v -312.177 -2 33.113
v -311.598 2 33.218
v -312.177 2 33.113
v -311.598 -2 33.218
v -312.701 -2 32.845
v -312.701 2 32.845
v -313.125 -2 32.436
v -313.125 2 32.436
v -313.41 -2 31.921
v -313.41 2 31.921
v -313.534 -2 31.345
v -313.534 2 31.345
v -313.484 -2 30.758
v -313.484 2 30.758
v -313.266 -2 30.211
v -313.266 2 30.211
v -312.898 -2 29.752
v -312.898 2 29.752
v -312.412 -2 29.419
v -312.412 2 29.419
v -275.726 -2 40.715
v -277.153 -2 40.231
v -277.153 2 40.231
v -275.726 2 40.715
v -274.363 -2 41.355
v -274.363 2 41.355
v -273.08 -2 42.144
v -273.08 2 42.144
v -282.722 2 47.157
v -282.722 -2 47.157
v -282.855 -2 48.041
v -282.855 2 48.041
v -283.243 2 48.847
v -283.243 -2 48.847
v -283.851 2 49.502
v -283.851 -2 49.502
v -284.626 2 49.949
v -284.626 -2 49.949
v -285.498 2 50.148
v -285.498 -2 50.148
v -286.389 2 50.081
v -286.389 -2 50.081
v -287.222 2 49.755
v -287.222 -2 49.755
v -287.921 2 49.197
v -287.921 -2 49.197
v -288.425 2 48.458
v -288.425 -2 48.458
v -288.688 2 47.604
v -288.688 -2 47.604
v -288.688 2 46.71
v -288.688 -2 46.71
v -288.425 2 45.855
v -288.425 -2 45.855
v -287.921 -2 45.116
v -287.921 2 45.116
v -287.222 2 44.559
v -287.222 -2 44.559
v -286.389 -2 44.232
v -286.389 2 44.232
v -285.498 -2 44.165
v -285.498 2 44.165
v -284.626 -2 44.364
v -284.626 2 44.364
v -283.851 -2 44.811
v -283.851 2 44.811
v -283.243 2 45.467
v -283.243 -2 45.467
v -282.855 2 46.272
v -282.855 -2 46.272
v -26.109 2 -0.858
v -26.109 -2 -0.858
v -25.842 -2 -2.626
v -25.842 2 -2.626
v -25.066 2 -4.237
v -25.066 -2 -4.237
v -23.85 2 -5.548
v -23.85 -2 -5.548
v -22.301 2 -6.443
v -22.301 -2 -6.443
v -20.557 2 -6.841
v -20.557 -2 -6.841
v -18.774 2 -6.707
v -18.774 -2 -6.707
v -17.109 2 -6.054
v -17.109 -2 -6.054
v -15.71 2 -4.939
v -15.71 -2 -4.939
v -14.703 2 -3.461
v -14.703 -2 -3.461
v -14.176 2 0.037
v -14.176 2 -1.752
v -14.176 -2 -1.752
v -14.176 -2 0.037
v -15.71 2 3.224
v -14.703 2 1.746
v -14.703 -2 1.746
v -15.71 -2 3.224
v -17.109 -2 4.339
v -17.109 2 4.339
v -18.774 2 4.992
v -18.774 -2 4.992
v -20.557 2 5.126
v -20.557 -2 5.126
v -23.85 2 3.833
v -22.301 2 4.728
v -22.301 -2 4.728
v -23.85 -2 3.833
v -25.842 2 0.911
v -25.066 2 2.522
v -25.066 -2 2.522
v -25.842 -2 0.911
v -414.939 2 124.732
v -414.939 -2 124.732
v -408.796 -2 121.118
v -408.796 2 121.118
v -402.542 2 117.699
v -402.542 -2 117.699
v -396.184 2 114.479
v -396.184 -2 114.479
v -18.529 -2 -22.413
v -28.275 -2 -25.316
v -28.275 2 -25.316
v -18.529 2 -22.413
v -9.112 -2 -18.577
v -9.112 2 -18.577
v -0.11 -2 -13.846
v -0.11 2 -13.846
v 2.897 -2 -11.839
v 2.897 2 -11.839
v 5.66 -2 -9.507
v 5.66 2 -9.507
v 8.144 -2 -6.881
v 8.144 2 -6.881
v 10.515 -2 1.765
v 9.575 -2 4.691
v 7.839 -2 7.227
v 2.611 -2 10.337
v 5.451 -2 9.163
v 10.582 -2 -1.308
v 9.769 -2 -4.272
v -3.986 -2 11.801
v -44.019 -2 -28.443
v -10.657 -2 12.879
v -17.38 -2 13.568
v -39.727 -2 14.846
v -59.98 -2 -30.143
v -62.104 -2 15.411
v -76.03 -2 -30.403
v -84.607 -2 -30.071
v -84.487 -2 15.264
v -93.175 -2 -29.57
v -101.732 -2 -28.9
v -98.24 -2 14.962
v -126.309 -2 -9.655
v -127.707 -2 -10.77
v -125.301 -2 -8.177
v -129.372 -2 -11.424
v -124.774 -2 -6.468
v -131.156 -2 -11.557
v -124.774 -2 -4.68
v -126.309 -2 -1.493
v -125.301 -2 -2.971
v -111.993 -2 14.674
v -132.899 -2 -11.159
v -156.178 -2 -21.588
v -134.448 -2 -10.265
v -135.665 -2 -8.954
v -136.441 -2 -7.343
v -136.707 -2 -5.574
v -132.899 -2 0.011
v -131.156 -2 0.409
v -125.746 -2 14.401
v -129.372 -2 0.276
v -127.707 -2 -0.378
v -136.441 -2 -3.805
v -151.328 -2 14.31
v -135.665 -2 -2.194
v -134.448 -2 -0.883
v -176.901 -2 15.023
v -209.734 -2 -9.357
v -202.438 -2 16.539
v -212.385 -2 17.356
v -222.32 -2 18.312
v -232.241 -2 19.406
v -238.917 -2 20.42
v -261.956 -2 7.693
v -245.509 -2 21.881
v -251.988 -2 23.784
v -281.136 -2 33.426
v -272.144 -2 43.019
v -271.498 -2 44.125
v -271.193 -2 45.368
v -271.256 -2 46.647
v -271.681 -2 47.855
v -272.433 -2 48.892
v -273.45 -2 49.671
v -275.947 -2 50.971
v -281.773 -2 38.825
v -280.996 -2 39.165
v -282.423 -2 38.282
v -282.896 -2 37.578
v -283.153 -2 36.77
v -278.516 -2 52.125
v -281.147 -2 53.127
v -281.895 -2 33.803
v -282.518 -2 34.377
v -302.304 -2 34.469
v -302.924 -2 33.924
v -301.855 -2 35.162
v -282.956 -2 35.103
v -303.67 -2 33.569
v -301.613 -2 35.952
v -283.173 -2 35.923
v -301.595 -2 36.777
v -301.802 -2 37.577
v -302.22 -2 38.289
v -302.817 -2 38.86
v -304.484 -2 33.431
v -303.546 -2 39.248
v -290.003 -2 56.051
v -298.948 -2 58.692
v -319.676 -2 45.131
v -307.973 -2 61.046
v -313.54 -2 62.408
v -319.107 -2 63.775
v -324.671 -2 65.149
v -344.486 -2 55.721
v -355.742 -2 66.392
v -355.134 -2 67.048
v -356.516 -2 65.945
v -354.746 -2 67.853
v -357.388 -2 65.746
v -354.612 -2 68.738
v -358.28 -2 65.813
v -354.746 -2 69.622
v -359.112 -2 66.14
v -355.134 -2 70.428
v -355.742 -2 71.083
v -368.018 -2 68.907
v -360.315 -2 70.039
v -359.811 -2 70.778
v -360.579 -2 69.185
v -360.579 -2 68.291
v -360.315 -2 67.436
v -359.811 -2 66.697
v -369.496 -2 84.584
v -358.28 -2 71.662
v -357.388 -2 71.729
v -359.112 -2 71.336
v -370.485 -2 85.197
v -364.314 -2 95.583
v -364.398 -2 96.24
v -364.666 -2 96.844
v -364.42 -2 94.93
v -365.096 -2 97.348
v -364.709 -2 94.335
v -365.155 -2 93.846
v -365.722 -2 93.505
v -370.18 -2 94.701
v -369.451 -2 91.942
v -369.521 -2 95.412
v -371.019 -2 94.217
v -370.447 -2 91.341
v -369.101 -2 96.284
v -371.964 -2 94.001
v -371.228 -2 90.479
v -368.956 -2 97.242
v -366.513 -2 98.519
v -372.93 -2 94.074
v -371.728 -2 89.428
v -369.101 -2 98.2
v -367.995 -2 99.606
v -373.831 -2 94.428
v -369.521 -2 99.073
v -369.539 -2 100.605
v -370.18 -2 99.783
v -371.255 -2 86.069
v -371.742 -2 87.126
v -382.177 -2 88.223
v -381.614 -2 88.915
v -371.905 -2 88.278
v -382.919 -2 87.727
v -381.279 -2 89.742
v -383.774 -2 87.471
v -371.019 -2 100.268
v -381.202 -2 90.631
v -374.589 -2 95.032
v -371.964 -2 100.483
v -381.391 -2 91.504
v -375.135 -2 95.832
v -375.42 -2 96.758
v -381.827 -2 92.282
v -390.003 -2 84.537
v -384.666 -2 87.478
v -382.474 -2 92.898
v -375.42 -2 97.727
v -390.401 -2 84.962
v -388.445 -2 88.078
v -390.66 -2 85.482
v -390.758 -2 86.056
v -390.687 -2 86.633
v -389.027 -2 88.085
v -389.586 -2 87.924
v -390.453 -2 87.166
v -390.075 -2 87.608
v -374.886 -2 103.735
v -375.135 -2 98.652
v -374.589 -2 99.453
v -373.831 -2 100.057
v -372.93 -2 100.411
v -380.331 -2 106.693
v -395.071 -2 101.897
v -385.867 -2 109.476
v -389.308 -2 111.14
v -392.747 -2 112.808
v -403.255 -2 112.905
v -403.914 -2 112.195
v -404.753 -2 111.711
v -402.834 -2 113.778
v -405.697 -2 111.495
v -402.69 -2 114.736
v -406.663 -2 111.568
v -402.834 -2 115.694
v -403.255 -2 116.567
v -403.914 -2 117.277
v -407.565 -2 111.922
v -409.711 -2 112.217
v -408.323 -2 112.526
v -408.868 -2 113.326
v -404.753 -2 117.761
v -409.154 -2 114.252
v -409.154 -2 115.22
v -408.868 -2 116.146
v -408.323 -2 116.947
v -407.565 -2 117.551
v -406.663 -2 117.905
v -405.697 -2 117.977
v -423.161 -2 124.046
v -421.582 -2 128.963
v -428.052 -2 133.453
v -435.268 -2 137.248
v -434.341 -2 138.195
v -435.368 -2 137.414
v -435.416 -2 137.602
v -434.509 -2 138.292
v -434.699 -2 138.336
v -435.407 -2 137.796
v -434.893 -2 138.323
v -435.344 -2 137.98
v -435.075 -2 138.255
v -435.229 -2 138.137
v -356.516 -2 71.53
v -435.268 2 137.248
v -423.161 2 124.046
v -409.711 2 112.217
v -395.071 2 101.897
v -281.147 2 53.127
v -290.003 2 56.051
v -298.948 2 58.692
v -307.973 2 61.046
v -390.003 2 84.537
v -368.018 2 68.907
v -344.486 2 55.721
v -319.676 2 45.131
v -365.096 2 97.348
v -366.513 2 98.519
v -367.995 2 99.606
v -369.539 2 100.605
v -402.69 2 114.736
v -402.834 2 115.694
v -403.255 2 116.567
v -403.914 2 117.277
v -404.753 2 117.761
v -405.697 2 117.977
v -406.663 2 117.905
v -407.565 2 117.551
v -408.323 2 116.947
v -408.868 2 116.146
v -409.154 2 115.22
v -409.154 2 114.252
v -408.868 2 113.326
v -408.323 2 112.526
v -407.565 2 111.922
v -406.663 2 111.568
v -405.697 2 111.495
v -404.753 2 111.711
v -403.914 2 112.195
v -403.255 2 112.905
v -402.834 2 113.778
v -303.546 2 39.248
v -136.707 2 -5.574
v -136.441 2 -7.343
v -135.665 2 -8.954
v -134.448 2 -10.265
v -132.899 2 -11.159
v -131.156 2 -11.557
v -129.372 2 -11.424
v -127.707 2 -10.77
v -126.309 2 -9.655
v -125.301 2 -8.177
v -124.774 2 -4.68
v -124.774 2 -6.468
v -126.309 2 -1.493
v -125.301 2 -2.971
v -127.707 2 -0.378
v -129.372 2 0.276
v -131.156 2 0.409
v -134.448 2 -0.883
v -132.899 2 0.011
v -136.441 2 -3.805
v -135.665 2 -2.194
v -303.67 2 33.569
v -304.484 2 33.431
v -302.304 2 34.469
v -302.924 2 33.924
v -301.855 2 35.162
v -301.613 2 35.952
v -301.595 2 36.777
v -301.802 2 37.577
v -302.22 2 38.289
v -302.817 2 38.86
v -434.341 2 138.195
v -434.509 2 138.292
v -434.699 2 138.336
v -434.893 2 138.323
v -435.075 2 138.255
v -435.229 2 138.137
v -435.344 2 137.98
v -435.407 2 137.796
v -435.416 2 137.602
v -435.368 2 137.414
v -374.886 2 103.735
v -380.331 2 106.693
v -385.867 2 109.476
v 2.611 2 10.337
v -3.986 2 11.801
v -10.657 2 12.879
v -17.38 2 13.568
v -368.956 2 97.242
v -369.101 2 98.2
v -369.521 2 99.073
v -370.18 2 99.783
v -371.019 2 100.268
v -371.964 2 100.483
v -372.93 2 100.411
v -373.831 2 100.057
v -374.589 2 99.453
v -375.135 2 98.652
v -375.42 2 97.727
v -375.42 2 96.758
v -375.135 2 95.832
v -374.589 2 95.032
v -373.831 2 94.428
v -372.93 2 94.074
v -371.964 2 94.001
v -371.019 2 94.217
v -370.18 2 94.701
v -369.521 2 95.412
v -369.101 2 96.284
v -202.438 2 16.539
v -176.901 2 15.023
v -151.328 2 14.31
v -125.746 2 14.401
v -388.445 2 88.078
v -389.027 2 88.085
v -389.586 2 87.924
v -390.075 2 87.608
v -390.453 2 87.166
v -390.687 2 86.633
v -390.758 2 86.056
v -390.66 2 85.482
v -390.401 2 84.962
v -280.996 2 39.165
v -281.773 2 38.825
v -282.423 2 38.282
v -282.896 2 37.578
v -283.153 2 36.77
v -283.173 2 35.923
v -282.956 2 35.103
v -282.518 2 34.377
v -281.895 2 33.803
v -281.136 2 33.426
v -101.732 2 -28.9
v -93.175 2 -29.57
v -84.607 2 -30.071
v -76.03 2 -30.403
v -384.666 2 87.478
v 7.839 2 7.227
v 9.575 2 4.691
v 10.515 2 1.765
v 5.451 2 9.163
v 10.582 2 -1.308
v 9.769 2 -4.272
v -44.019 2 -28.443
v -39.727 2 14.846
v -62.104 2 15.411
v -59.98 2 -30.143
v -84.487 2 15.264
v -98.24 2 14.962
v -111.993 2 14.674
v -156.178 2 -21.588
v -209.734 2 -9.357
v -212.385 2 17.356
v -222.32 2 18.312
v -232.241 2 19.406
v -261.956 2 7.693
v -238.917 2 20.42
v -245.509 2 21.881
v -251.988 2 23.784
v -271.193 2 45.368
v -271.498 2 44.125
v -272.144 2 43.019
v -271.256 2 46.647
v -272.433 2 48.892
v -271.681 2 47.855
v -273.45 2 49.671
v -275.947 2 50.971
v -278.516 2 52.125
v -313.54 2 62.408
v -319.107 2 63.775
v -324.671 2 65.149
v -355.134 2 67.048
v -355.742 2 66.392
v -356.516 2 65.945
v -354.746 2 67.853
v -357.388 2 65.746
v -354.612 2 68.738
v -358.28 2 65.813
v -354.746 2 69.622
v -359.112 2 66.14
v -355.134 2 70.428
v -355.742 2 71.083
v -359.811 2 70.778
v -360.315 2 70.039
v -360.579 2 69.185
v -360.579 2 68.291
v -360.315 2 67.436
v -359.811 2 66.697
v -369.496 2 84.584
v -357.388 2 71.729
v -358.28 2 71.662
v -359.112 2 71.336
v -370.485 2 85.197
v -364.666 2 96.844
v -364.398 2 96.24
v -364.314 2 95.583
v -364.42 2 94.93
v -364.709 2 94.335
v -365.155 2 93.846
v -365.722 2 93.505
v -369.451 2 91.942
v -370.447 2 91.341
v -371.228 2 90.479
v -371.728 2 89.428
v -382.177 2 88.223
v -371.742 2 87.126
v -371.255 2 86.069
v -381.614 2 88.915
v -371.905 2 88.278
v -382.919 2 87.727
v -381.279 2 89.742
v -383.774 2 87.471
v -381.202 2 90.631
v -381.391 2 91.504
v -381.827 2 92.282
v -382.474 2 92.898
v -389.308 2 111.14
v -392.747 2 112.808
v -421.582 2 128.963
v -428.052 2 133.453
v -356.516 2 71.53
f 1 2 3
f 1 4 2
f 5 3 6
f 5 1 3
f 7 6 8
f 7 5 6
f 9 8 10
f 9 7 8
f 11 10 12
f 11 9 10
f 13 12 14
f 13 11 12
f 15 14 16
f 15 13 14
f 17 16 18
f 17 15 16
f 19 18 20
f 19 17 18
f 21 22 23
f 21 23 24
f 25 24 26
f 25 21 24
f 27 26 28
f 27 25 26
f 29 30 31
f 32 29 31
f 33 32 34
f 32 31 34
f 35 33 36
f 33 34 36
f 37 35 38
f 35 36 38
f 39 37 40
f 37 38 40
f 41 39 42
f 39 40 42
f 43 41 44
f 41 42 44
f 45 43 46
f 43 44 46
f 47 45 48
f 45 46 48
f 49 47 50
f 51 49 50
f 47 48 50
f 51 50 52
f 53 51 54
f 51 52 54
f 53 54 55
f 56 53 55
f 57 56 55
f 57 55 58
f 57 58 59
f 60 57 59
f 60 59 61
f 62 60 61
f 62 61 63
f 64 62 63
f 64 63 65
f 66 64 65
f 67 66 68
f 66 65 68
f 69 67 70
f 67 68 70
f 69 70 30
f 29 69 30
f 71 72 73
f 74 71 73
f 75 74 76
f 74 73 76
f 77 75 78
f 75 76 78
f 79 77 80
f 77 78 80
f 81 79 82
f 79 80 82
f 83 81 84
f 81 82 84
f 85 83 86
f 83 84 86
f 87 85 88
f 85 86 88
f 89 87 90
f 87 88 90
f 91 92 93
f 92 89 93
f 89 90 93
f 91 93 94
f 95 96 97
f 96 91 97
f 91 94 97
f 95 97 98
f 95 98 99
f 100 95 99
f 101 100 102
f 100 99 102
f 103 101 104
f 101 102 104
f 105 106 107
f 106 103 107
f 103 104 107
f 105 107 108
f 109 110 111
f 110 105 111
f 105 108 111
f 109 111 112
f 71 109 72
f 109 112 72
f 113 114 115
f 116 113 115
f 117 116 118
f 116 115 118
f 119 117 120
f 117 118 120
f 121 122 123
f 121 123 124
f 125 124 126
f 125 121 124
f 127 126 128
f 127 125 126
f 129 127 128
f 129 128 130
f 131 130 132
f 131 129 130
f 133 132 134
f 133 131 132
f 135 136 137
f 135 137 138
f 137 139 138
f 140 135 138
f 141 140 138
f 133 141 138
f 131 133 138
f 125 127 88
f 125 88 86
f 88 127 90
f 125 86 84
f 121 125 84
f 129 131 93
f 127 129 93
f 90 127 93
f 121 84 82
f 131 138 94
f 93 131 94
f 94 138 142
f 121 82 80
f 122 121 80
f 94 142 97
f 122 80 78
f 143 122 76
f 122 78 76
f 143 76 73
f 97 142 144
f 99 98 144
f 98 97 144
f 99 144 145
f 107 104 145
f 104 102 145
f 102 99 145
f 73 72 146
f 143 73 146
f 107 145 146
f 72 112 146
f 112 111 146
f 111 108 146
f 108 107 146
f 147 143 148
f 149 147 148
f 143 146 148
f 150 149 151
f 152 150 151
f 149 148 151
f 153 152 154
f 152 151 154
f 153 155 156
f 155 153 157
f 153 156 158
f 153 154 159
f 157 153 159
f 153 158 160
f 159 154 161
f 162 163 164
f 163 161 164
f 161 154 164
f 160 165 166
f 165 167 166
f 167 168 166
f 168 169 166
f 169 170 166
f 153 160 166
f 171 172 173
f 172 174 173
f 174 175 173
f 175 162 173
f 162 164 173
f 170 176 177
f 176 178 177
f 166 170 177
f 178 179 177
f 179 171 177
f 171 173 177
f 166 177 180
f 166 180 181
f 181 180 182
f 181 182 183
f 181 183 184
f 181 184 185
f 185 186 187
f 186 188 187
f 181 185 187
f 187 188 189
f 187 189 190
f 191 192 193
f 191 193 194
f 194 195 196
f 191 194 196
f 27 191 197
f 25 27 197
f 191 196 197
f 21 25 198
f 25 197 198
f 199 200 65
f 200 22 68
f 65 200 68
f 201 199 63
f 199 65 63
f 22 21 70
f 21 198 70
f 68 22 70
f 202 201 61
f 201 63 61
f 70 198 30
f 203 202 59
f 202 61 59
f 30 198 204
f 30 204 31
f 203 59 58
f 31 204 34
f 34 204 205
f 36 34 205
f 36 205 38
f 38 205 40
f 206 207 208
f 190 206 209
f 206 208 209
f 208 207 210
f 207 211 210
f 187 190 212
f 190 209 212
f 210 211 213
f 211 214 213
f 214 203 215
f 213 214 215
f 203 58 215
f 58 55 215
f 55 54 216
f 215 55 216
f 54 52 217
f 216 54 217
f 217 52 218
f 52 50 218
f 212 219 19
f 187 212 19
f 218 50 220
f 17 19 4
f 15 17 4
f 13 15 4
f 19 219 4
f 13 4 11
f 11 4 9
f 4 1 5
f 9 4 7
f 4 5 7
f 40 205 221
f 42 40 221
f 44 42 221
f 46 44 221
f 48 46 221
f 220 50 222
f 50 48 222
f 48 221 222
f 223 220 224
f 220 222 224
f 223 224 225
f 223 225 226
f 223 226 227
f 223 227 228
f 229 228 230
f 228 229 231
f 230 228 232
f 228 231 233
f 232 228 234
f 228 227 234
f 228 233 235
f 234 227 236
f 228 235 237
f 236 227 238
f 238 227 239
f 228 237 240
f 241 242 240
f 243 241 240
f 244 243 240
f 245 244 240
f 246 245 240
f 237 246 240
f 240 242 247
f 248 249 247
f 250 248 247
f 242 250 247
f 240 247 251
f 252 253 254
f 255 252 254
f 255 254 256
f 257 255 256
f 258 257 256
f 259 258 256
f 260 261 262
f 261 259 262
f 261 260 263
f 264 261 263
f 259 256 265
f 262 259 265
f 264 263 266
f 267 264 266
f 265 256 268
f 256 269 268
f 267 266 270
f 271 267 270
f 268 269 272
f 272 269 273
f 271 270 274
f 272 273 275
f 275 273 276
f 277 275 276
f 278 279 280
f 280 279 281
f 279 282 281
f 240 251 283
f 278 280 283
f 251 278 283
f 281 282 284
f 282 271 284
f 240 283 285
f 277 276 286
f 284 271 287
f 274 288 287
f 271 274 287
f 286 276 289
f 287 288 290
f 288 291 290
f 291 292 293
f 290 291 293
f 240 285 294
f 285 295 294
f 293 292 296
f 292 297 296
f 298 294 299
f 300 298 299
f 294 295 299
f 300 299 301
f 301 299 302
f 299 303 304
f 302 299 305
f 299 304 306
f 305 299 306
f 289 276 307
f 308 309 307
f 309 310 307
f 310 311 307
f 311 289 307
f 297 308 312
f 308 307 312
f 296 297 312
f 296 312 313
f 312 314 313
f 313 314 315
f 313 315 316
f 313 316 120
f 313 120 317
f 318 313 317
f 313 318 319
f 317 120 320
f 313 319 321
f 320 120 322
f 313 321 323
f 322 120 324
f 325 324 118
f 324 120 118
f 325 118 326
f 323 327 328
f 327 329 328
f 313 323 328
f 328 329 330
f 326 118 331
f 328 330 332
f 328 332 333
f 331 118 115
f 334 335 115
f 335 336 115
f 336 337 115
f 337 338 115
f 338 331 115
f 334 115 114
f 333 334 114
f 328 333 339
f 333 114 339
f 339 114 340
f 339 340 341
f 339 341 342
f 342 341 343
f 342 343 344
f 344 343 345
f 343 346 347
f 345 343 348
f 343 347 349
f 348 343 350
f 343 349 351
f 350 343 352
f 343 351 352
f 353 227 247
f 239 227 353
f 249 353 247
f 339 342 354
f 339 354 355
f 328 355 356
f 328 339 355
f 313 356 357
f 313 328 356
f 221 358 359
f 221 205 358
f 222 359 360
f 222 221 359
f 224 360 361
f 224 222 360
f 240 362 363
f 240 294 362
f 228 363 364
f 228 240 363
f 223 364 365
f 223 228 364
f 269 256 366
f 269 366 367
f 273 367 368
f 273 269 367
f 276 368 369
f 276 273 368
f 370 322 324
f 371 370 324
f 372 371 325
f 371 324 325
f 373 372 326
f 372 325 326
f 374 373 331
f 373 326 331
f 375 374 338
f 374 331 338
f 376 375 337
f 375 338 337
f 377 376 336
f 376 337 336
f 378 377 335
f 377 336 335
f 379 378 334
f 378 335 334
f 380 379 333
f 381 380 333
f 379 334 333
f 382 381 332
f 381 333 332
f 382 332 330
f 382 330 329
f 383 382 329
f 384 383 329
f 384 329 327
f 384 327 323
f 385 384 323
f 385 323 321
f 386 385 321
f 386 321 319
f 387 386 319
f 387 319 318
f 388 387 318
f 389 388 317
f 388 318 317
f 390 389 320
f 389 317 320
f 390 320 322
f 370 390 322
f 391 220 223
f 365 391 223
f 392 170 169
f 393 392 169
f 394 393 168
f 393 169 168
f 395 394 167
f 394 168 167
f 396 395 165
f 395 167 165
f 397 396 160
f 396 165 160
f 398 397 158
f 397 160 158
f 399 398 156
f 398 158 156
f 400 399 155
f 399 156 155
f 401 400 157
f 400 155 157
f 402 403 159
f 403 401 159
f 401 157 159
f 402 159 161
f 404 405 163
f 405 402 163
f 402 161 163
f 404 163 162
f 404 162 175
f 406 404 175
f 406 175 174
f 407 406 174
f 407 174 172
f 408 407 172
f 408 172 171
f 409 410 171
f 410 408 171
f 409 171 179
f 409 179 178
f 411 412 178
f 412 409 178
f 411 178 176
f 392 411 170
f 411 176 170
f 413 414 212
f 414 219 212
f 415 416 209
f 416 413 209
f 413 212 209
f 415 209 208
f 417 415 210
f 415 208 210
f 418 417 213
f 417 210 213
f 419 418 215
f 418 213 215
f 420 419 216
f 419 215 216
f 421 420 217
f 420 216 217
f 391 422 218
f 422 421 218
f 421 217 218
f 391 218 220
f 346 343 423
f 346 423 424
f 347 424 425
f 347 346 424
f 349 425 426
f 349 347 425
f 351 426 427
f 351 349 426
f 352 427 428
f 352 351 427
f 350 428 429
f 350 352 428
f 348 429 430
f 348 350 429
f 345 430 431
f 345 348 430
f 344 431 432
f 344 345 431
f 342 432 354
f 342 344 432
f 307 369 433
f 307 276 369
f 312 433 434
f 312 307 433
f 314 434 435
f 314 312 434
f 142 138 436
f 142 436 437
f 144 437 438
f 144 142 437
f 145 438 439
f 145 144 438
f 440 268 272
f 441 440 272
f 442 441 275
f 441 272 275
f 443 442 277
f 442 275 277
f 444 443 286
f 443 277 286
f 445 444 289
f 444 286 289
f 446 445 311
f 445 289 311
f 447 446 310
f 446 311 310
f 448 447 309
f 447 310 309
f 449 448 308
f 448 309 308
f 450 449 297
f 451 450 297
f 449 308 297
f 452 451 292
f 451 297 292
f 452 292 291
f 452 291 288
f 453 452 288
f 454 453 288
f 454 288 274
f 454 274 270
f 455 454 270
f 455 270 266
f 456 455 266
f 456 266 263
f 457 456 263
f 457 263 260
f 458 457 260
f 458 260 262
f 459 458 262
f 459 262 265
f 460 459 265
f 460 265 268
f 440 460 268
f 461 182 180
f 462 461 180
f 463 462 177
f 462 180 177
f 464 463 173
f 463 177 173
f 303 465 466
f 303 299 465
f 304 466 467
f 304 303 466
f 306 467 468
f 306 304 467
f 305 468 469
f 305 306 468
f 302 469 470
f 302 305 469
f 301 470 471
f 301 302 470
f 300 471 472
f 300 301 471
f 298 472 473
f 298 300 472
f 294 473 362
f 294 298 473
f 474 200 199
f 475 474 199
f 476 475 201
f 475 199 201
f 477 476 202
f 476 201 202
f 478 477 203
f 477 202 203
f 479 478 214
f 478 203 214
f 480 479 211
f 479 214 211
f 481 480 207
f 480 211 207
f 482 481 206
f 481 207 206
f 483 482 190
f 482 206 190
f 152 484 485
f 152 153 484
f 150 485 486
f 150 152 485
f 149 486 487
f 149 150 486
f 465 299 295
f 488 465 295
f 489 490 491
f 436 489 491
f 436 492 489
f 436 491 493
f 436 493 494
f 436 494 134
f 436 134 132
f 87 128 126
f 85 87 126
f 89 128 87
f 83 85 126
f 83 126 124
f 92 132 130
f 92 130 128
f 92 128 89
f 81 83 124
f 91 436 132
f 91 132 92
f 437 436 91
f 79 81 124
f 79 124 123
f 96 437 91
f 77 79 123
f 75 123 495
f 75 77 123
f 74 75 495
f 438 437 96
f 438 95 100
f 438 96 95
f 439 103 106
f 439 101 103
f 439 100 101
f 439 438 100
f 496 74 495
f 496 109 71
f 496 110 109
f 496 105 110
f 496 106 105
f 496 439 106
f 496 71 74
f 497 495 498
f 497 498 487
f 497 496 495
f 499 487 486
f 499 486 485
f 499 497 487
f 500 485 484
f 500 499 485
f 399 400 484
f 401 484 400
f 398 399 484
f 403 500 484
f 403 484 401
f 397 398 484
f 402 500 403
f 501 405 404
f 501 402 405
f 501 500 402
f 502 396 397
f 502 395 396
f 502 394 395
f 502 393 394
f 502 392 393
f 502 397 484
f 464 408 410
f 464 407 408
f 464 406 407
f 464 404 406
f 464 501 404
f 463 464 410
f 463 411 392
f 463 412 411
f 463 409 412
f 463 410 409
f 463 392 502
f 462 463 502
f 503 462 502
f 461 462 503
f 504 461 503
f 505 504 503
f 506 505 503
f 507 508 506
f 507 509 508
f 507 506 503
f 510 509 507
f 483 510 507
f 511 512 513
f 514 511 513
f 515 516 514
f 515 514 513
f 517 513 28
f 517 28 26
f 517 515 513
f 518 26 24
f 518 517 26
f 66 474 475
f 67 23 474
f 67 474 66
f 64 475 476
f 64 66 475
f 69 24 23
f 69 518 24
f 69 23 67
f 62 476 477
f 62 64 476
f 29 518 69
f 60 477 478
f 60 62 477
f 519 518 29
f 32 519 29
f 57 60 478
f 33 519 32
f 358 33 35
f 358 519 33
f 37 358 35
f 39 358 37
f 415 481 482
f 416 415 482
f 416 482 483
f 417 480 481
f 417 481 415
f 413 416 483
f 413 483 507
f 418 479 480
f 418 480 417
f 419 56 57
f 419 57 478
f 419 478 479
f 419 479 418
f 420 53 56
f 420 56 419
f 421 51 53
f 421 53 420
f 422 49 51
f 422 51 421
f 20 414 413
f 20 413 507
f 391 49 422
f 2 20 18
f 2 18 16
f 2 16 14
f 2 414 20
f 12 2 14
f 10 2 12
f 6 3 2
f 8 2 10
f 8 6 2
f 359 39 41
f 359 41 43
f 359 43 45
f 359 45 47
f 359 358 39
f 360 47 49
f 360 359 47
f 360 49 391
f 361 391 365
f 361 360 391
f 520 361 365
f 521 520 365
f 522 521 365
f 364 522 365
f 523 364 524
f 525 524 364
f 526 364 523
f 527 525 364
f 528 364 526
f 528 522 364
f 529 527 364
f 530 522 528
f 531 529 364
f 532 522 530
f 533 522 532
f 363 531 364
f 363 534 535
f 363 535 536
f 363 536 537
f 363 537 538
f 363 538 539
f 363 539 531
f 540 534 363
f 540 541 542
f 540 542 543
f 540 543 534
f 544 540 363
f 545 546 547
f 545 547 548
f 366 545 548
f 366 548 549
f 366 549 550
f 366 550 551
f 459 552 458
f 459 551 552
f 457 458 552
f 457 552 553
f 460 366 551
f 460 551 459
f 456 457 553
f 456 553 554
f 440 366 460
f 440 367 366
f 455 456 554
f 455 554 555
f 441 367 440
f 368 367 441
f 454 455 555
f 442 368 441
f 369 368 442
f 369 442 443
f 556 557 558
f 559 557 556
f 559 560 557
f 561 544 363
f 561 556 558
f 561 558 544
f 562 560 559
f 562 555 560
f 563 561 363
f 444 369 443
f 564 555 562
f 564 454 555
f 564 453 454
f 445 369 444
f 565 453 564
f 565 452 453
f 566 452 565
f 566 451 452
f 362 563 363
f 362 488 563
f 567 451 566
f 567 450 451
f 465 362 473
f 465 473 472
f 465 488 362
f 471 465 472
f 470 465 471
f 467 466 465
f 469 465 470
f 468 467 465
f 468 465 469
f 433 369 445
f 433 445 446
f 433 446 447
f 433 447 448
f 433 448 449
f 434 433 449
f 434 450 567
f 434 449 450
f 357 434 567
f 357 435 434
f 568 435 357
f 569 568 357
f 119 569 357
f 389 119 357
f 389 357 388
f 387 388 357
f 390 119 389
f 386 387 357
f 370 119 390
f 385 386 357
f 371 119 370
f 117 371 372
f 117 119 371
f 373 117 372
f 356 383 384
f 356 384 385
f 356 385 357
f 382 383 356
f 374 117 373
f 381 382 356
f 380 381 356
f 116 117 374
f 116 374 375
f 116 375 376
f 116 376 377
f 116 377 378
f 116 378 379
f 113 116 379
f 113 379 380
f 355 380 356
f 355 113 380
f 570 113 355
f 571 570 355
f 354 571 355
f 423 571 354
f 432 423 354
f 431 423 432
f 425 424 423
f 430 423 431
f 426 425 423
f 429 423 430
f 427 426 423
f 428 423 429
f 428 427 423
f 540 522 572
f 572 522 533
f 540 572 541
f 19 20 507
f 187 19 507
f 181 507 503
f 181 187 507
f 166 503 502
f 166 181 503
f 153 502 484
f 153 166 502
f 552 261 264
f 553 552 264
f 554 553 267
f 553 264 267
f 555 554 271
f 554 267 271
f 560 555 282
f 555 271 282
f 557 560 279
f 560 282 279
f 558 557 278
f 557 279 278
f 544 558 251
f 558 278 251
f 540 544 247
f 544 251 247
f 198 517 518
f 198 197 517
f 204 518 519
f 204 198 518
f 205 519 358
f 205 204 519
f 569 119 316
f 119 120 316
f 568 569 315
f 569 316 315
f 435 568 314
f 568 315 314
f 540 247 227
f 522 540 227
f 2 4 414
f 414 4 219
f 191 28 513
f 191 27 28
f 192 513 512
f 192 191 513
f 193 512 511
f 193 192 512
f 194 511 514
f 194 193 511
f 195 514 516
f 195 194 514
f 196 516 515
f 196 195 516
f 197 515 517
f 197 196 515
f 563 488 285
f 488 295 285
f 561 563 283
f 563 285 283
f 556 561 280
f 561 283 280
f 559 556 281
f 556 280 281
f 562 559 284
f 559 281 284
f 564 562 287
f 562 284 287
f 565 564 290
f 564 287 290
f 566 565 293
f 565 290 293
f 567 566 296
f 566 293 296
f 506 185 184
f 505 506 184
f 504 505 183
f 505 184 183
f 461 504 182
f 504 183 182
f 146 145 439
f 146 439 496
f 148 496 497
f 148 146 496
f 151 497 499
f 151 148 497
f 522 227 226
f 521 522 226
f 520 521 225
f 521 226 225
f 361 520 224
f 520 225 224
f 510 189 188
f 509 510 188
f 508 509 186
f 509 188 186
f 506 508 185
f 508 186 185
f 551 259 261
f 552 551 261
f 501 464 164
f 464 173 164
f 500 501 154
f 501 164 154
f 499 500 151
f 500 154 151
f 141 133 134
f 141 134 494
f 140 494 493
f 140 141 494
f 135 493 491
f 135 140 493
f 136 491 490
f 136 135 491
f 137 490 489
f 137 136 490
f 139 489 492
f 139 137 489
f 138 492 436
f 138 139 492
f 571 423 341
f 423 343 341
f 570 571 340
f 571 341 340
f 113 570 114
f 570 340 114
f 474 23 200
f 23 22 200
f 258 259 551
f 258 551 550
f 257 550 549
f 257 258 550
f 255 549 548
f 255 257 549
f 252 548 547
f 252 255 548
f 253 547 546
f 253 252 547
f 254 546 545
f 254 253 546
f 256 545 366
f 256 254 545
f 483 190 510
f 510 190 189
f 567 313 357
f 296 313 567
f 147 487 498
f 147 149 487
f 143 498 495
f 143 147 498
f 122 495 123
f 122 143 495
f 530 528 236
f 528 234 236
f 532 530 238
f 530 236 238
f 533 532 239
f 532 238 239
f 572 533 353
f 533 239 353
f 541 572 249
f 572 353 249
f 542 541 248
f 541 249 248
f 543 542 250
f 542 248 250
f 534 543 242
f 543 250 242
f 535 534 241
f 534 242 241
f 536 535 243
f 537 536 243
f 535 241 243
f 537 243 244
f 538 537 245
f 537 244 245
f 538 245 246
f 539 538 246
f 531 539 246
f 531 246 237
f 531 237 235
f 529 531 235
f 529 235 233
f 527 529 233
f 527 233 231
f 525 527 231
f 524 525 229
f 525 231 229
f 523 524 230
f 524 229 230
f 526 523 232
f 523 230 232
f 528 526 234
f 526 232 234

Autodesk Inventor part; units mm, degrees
ref_plane "YZ Plane" through (0, 0, 0) normal (1, 0, 0) x (0, 1, 0)
ref_plane "XZ Plane" through (0, 0, 0) normal (0, 1, 0) x (-1, 0, 0)
ref_plane "XY Plane" through (0, 0, 0) normal (0, 0, 1) x (1, 0, 0)
sketch "スケッチ1" plane through (0, 0, 0) normal (0, 1, 0) x (-1, 0, 0)
  arc A0 (395.0712, 101.8969) -> (435.2675, 137.2475) centre (306.3013, 243.3635) ccw
  arc A1 (365.0957, 97.3477) -> (365.7216, 93.5054) centre (366.6087, 95.622) ccw
  arc A2 (369.5386, 100.605) -> (365.0957, 97.3477) centre (385.9519, 73.5593) ccw
  arc A3 (385.8674, 109.4763) -> (369.5386, 100.605) centre (470.4646, -65.7001) ccw
  arc A4 (385.8674, 109.4763) -> (396.1841, 114.479) centre (-1159.575, 3309.6389) ccw
  arc A5 (396.1841, 114.479) -> (414.939, 124.7316) centre (296.9263, 318.331) ccw
  arc A6 (414.939, 124.7316) -> (434.3408, 138.1953) centre (311.0977, 295.0828) ccw
  arc A7 (435.2675, 137.2475) -> (434.3408, 138.1953) centre (434.7527, 137.6711) ccw
  arc A8 (319.6761, 45.1314) -> (390.0033, 84.5371) centre (233.4832, 281.4189) ccw
  arc A9 (273.0796, 42.1444) -> (277.153, 40.2312) centre (280.7432, 53.1684) ccw
  arc A10 (273.4497, 49.6709) -> (273.0796, 42.1444) centre (275.6154, 45.792) ccw
  arc A11 (281.147, 53.127) -> (273.4497, 49.6709) centre (297.0704, 7.3635) ccw
  arc A12 (307.9726, 61.0464) -> (281.147, 53.127) centre (377.3682, -223.4121) ccw
  arc A13 (307.9726, 61.0464) -> (324.6713, 65.1488) centre (-955.196, 5238.8807) ccw
  circle A14 centre (20.1088, -0.8575) radius 6
  circle A15 centre (130.7072, -5.574) radius 6
  arc A16 (390.0033, 84.5371) -> (388.4453, 88.078) centre (388.7587, 86.1027) ccw
  line L0 (388.4453, 88.078) -> (384.6663, 87.4784)
  arc A17 (382.4737, 92.8975) -> (384.6663, 87.4784) centre (384.1962, 90.4413) ccw
  arc A18 (281.147, 53.127) -> (273.4497, 49.6709) centre (297.0704, 7.3635) ccw
  line L1 (277.153, 40.2312) -> (280.996, 39.1647)
  arc A19 (281.136, 33.4257) -> (280.996, 39.1647) centre (280.1938, 36.274) ccw
  line L2 (281.136, 33.4257) -> (251.9878, 23.784)
  arc A20 (232.2409, 19.4065) -> (251.9878, 23.784) centre (220.5829, 118.7246) ccw
  arc A21 (202.438, 16.5387) -> (232.2409, 19.4065) centre (148.7903, 730.3461) ccw
  arc A22 (125.7464, 14.4013) -> (202.438, 16.5387) centre (141.4444, 828.0876) ccw
  arc A23 (84.4867, 15.2639) -> (125.7464, 14.4013) centre (372.4747, 12803.2702) ccw
  arc A24 (84.4867, 15.2639) -> (17.3799, 13.5681) centre (68.6653, -687.2803) ccw
  arc A25 (17.3799, 13.5681) -> (-2.611, 10.3374) centre (25.867, -102.4131) ccw
  arc A26 (-2.611, 10.3374) -> (-8.1443, -6.881) centre (0, 0) ccw
  arc A27 (-8.1443, -6.881) -> (0.1105, -13.8465) centre (16.4695, 13.9147) ccw
  arc A28 (0.1105, -13.8465) -> (28.2747, -25.3165) centre (53.2618, 76.3513) ccw
  arc A29 (28.2747, -25.3165) -> (76.0298, -30.4027) centre (70.8911, 148.0818) ccw
  arc A30 (76.0298, -30.4027) -> (101.7324, -28.9004) centre (63.5115, 404.3974) ccw
  arc A31 (101.7324, -28.9004) -> (312.4116, 29.4193) centre (48.6916, 572.4065) ccw
  arc A32 (312.4116, 29.4193) -> (311.5978, 33.2175) centre (311.5379, 31.2183) ccw
  line L3 (311.5978, 33.2175) -> (304.4845, 33.4306)
  arc A33 (303.5463, 39.2476) -> (304.4845, 33.4306) centre (304.5744, 36.4292) ccw
  line L4 (303.5463, 39.2476) -> (319.6761, 45.1314)
  line L5 (365.7216, 93.5054) -> (369.4507, 91.9425)
  arc A34 (369.4958, 84.5835) -> (369.4507, 91.9425) centre (367.9046, 88.2534) ccw
  line L6 (369.4958, 84.5835) -> (324.6713, 65.1488)
  line L7 (395.0712, 101.8969) -> (382.4737, 92.8975)
  point P0 (0, 0)
  dimension "d1" = 4
extrude "押し出し2" add sketch "スケッチ1" along normal mid plane 4
sketch "スケッチ2" plane through (0, -2, 0) normal (0, -1, 0) x (1, 0, 0)
  circle A0 centre (-372.2064, 97.2423) radius 3.25
  circle A1 centre (-405.9401, 114.7361) radius 3.25
  line L0 (-405.9401, 114.7361) -> (-372.2064, 97.2423)
  point P0 (0, 0)
  dimension "d6" = 6.5
  dimension "d7" = 6.5
  dimension "d8" = 38
extrude "押し出し3" cut sketch "スケッチ2" against normal blind 10
sketch "スケッチ3" plane through (0, -2, 0) normal (0, -1, 0) x (1, 0, 0)
  circle A0 centre (-357.6123, 68.7377) radius 3 projected
  circle A1 centre (-285.7217, 47.1567) radius 3 projected
  point P0 (0, 0)
extrude "押し出し4" cut sketch "スケッチ3" against normal through all
properties part number "newbracket2"
